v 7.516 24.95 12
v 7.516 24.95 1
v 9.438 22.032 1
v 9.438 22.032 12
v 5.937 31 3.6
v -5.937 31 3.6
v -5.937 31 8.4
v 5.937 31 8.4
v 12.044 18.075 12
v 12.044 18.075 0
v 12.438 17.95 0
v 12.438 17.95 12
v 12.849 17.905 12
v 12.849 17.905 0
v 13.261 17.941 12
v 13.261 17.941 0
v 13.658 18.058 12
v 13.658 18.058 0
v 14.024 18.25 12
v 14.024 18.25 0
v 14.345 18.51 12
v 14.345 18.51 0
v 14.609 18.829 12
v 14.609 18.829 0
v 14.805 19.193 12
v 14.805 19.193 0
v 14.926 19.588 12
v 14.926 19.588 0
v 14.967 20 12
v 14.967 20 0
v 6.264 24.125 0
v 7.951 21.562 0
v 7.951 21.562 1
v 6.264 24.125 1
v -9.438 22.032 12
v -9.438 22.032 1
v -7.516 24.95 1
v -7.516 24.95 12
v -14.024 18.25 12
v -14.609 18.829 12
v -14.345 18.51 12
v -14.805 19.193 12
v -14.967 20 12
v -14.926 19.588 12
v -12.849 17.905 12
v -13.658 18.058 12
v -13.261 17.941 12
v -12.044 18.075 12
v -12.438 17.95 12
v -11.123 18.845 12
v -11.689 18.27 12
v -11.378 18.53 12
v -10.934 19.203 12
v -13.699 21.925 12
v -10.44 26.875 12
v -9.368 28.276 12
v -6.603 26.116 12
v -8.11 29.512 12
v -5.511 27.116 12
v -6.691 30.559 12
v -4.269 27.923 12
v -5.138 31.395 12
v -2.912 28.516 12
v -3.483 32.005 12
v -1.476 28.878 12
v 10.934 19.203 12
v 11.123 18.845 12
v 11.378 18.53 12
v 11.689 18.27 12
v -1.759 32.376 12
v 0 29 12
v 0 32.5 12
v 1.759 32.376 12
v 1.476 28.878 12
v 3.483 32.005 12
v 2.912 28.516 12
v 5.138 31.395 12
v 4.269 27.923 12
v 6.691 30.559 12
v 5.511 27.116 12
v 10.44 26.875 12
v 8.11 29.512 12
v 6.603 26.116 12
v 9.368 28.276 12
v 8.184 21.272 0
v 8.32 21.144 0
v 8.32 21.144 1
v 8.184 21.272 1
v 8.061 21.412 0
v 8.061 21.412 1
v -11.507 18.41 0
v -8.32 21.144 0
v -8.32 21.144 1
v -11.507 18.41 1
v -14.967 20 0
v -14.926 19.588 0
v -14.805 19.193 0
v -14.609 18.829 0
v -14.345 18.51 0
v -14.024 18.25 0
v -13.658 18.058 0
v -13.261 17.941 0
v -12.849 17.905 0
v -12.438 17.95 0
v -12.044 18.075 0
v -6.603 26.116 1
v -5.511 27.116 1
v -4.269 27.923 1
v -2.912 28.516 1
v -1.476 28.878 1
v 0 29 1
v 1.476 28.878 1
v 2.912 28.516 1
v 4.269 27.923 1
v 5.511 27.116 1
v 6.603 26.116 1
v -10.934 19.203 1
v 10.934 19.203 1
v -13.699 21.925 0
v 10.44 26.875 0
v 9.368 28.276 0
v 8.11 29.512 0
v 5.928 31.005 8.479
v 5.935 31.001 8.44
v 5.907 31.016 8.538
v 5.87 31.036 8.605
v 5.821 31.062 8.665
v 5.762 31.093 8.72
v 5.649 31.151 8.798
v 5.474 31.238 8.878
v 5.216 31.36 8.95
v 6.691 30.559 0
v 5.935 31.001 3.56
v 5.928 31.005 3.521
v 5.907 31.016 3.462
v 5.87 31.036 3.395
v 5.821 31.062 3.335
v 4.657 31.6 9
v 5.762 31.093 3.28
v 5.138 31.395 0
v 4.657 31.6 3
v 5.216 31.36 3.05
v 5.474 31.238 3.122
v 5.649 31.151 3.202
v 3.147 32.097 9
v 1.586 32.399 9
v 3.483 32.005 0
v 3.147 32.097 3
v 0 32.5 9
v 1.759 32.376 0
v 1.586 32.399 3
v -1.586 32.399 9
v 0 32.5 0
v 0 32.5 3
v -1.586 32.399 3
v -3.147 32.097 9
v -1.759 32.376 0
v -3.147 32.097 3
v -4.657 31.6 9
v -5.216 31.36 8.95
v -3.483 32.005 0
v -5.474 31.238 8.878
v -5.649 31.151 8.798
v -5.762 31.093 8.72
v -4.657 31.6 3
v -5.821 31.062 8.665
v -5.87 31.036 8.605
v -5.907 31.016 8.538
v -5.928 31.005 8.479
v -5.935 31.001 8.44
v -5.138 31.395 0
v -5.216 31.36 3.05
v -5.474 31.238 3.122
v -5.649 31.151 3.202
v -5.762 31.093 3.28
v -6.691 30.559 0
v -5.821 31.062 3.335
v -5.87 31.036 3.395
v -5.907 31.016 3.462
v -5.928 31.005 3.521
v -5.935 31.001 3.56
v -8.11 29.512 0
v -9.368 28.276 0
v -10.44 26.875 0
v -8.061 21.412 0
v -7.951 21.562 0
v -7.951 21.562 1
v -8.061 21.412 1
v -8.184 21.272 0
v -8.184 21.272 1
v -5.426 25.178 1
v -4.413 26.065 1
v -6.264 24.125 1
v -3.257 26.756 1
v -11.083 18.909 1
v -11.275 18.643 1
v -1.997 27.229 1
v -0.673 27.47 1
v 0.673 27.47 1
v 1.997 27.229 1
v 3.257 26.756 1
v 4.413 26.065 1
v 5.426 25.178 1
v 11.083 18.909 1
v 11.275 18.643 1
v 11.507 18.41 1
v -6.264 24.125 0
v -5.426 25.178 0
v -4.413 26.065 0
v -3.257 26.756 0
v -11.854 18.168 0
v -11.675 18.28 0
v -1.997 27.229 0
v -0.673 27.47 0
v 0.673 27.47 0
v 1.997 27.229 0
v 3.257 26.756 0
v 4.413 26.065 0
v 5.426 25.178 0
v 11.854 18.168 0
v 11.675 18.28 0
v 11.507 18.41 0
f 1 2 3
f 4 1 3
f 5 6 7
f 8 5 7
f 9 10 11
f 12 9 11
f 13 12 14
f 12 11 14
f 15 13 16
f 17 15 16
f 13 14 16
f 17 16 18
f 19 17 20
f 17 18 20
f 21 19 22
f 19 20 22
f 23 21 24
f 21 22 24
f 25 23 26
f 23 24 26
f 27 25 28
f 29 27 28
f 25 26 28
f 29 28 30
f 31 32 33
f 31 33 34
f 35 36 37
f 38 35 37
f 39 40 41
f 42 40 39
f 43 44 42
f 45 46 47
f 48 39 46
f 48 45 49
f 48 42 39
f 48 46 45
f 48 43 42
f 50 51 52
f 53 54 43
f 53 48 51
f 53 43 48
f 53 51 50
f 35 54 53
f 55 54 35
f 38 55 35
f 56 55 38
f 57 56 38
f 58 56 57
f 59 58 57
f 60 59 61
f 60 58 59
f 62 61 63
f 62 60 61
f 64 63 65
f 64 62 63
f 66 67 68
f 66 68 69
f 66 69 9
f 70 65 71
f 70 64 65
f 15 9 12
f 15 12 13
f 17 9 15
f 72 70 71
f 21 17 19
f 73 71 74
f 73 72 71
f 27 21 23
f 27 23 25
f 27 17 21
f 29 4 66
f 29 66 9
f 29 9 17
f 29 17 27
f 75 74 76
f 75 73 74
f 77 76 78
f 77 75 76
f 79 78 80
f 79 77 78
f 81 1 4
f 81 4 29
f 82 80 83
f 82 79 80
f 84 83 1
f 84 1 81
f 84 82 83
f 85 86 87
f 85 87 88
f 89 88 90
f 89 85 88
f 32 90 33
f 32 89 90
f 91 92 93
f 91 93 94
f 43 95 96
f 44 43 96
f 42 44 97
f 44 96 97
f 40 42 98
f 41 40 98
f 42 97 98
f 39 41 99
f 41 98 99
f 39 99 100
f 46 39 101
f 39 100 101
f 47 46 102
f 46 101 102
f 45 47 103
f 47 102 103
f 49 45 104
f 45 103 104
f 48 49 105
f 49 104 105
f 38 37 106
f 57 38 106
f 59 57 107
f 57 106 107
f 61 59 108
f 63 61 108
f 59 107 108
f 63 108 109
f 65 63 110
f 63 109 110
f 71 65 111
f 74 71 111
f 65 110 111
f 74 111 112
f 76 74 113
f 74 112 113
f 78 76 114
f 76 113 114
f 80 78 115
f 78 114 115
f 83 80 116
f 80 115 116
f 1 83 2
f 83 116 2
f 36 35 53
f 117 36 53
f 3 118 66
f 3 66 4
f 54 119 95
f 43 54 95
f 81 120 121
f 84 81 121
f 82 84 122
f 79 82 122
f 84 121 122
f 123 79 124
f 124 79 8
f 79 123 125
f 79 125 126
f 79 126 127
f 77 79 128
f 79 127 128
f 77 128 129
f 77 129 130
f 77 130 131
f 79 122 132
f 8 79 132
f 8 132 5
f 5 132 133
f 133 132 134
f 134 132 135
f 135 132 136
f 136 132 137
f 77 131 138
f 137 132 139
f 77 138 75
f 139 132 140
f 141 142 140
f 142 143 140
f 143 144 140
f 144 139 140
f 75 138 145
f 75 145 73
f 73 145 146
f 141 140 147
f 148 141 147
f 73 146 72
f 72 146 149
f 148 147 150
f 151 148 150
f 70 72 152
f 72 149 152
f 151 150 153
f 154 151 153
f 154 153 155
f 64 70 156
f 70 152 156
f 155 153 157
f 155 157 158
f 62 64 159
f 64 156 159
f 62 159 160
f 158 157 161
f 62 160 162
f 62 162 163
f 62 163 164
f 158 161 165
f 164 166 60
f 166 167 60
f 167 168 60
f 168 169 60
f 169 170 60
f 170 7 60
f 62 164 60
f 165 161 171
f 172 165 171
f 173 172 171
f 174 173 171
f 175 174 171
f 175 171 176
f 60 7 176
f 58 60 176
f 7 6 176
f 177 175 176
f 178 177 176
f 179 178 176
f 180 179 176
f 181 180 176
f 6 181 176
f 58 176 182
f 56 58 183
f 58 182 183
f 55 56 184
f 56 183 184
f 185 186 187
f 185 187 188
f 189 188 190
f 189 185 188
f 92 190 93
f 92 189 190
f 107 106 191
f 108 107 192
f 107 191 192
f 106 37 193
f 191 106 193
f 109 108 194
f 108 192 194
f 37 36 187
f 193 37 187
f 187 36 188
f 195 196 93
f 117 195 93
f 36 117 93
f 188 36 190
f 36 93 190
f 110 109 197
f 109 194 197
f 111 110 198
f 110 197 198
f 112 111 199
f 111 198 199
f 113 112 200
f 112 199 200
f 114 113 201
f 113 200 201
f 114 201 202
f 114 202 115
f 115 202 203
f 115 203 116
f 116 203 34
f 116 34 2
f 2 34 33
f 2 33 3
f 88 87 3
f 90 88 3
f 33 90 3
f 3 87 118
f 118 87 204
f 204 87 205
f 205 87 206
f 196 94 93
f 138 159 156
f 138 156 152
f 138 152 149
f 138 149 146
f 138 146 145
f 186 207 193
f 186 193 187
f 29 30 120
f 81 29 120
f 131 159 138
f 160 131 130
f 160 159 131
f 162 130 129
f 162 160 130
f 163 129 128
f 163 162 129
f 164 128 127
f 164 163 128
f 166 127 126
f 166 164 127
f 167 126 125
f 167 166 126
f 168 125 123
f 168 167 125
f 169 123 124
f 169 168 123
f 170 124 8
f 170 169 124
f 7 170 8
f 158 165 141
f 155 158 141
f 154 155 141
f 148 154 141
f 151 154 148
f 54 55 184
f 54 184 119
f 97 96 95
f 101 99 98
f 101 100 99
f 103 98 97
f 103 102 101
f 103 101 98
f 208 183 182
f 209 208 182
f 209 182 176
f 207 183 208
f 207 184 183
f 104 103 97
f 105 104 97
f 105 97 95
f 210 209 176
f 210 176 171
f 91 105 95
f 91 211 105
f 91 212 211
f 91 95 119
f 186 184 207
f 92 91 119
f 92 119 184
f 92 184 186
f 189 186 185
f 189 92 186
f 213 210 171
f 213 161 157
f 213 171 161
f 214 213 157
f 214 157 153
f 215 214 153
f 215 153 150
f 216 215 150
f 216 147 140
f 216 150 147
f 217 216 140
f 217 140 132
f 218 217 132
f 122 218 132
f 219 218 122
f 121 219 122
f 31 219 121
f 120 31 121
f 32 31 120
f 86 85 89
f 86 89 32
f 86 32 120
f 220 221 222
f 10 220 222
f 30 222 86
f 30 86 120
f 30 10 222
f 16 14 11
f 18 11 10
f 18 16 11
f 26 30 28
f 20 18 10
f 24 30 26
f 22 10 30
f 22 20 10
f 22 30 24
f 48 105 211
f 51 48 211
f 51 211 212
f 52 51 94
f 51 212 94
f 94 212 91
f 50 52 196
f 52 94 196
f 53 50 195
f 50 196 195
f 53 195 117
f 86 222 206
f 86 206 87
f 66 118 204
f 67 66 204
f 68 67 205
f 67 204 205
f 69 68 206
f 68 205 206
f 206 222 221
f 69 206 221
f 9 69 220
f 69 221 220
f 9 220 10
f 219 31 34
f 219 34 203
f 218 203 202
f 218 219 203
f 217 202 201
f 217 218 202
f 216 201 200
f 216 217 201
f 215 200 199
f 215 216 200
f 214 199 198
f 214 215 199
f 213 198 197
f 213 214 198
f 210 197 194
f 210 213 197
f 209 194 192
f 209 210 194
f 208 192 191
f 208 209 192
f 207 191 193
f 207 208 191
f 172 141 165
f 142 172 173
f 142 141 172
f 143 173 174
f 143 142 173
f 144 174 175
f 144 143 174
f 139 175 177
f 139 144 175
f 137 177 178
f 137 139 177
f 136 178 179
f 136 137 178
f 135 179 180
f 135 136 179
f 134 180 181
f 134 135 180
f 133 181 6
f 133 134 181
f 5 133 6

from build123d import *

# Parameters (mm, degrees)
F1_DEPTH    = 12
F2_W        = 1.5
F2_H        = 6
F3_DEPTH    = 12.5
F4_R        = 0.6
F5_T1_DEPTH = 12
F7_DEPTH    = 1


# Not quite as in the source:
# - a fillet or chamfer that OpenCascade refuses, or shapes differently, is made with other operations: its cross-section is extruded or revolved along the edge and cut away or added


with BuildPart() as f1:
    # F0 (on Top) → F1 (new body)
    with BuildSketch(Plane.XY):
        with BuildLine():
            ThreePointArc((-7.5164818898, 24.95), (0, 29), (7.5164818898, 24.95))
            Line((7.5164818898, 24.95), (10.7763181216, 20))
            Line((10.7763181216, 20), (14.9671085022, 20))
            Line((14.9671085022, 20), (10.4395581803, 26.875))
            ThreePointArc((10.4395581803, 26.875), (0, 32.5), (-10.4395581803, 26.875))
            Line((-10.4395581803, 26.875), (-13.6993944121, 21.925))
            ThreePointArc((-13.6993944121, 21.925), (-11.7192459572, 21.75), (-10.7763181216, 20))
            Line((-10.7763181216, 20), (-7.5164818898, 24.95))
        make_face()
        with BuildLine():
            Line((14.9671085022, 20), (10.7763181216, 20))
            Line((10.7763181216, 20), (12.0440322117, 18.075))
            ThreePointArc((12.0440322117, 18.075), (14.0241806666, 18.25), (14.9671085022, 20))
        make_face()
        with BuildLine():
            Line((12.0440322117, 18.075), (10.7763181216, 20))
            ThreePointArc((10.7763181216, 20), (11.1217133119, 18.8475326453), (12.0440322117, 18.075))
        make_face()
        with BuildLine():
            ThreePointArc((-12.0440322117, 18.075), (-11.1217133119, 18.8475326453), (-10.7763181216, 20))
            Line((-10.7763181216, 20), (-12.0440322117, 18.075))
        make_face()
        with BuildLine():
            Line((-12.0440322117, 18.075), (-10.7763181216, 20))
            Line((-10.7763181216, 20), (-14.9671085022, 20))
            ThreePointArc((-14.9671085022, 20), (-14.0241806666, 18.25), (-12.0440322117, 18.075))
        make_face()
        with BuildLine():
            Line((-14.9671085022, 20), (-10.7763181216, 20))
            ThreePointArc((-10.7763181216, 20), (-11.7192459572, 21.75), (-13.6993944121, 21.925))
            Line((-13.6993944121, 21.925), (-14.9671085022, 20))
        make_face()
    extrude(amount=F1_DEPTH)

    # F2 (on Right) → F3 (cut, symmetric)
    with BuildSketch(Plane.YZ):
        with Locations((31.75, 6)):
            Rectangle(F2_W, F2_H)
    extrude(amount=F3_DEPTH, both=True, mode=Mode.SUBTRACT)

    # F4
    f4_edges = [f1.edges().sort_by_distance(p)[0] for p in [
        (0, 31, 9),
        (0, 31, 3),
    ]]
    fillet(f4_edges, radius=F4_R)

    # F5: chamfer of 5 on 2 edges, made by hand

    # F5_s2 → F5_t1 (join)
    with BuildSketch(Plane.XY):
        with BuildLine():
            Line((11.0273555293, 19.0260146009), (9.3449019992, 22.2084505142))
            Line((9.3449019992, 22.2084505142), (9.4284184646, 22.2634505142))
            ThreePointArc((9.4284184646, 22.2634505142), (10.1361174506, 21.1539508584), (10.859834587, 20.055))
            Line((10.859834587, 20.055), (10.8763181216, 20))
            ThreePointArc((10.8763181216, 20), (10.9346351532, 19.5211157003), (11.1198360632, 19.0640586655))
            Line((11.1198360632, 19.0640586655), (11.0273555293, 19.0260146009))
        make_face()
        with BuildLine():
            Line((-9.3449019992, 22.2084505142), (-11.0273555293, 19.0260146009))
            Line((-11.0273555293, 19.0260146009), (-11.1198360632, 19.0640586655))
            ThreePointArc((-11.1198360632, 19.0640586655), (-10.9346351532, 19.5211157003), (-10.8763181216, 20))
            Line((-10.8763181216, 20), (-10.859834587, 20.055))
            ThreePointArc((-10.859834587, 20.055), (-10.1361174506, 21.1539508584), (-9.4284184646, 22.2634505142))
            Line((-9.4284184646, 22.2634505142), (-9.3449019992, 22.2084505142))
        make_face()
    extrude(amount=F5_T1_DEPTH)

    # F6 (on face) → F7 (join)
    with BuildSketch(Plane(origin=(0, 0, 0), x_dir=(1, 0, 0), z_dir=(0, 0, -1))):
        with BuildLine():
            ThreePointArc((-7.5164818898, -24.95), (0, -29), (7.5164818898, -24.95))
            Line((7.5164818898, -24.95), (9.4383768754, -22.0316386155))
            Line((9.4383768756, -22.0316386152), (10.9338806529, -19.2028264998))
            ThreePointArc((10.9338806529, -19.2028264998), (11.1736784475, -18.772254667), (11.507412541, -18.4096024365))
            Line((11.507412541, -18.4096024365), (8.3196064123, -21.1442182701))
            ThreePointArc((8.3196064123, -21.1442182701), (8.1209139726, -21.3403362232), (7.9514665684, -21.5622112204))
            Line((7.9514665684, -21.5622112204), (6.2637349082, -24.125))
            ThreePointArc((6.2637349082, -24.125), (0, -27.5), (-6.2637349082, -24.125))
            Line((-6.2637349082, -24.125), (-7.9514665684, -21.5622112204))
            ThreePointArc((-7.9514665684, -21.5622112204), (-8.1209139726, -21.3403362232), (-8.3196064123, -21.1442182701))
            Line((-8.3196064123, -21.1442182701), (-11.507412541, -18.4096024365))
            ThreePointArc((-11.507412541, -18.4096024365), (-11.1736784475, -18.772254667), (-10.9338806529, -19.2028264998))
            Line((-10.9338806529, -19.2028264998), (-9.4383768756, -22.0316386152))
            Line((-9.4383768756, -22.0316386152), (-7.5164818898, -24.95))
        make_face()
    extrude(amount=-F7_DEPTH)


solid = f1.part
